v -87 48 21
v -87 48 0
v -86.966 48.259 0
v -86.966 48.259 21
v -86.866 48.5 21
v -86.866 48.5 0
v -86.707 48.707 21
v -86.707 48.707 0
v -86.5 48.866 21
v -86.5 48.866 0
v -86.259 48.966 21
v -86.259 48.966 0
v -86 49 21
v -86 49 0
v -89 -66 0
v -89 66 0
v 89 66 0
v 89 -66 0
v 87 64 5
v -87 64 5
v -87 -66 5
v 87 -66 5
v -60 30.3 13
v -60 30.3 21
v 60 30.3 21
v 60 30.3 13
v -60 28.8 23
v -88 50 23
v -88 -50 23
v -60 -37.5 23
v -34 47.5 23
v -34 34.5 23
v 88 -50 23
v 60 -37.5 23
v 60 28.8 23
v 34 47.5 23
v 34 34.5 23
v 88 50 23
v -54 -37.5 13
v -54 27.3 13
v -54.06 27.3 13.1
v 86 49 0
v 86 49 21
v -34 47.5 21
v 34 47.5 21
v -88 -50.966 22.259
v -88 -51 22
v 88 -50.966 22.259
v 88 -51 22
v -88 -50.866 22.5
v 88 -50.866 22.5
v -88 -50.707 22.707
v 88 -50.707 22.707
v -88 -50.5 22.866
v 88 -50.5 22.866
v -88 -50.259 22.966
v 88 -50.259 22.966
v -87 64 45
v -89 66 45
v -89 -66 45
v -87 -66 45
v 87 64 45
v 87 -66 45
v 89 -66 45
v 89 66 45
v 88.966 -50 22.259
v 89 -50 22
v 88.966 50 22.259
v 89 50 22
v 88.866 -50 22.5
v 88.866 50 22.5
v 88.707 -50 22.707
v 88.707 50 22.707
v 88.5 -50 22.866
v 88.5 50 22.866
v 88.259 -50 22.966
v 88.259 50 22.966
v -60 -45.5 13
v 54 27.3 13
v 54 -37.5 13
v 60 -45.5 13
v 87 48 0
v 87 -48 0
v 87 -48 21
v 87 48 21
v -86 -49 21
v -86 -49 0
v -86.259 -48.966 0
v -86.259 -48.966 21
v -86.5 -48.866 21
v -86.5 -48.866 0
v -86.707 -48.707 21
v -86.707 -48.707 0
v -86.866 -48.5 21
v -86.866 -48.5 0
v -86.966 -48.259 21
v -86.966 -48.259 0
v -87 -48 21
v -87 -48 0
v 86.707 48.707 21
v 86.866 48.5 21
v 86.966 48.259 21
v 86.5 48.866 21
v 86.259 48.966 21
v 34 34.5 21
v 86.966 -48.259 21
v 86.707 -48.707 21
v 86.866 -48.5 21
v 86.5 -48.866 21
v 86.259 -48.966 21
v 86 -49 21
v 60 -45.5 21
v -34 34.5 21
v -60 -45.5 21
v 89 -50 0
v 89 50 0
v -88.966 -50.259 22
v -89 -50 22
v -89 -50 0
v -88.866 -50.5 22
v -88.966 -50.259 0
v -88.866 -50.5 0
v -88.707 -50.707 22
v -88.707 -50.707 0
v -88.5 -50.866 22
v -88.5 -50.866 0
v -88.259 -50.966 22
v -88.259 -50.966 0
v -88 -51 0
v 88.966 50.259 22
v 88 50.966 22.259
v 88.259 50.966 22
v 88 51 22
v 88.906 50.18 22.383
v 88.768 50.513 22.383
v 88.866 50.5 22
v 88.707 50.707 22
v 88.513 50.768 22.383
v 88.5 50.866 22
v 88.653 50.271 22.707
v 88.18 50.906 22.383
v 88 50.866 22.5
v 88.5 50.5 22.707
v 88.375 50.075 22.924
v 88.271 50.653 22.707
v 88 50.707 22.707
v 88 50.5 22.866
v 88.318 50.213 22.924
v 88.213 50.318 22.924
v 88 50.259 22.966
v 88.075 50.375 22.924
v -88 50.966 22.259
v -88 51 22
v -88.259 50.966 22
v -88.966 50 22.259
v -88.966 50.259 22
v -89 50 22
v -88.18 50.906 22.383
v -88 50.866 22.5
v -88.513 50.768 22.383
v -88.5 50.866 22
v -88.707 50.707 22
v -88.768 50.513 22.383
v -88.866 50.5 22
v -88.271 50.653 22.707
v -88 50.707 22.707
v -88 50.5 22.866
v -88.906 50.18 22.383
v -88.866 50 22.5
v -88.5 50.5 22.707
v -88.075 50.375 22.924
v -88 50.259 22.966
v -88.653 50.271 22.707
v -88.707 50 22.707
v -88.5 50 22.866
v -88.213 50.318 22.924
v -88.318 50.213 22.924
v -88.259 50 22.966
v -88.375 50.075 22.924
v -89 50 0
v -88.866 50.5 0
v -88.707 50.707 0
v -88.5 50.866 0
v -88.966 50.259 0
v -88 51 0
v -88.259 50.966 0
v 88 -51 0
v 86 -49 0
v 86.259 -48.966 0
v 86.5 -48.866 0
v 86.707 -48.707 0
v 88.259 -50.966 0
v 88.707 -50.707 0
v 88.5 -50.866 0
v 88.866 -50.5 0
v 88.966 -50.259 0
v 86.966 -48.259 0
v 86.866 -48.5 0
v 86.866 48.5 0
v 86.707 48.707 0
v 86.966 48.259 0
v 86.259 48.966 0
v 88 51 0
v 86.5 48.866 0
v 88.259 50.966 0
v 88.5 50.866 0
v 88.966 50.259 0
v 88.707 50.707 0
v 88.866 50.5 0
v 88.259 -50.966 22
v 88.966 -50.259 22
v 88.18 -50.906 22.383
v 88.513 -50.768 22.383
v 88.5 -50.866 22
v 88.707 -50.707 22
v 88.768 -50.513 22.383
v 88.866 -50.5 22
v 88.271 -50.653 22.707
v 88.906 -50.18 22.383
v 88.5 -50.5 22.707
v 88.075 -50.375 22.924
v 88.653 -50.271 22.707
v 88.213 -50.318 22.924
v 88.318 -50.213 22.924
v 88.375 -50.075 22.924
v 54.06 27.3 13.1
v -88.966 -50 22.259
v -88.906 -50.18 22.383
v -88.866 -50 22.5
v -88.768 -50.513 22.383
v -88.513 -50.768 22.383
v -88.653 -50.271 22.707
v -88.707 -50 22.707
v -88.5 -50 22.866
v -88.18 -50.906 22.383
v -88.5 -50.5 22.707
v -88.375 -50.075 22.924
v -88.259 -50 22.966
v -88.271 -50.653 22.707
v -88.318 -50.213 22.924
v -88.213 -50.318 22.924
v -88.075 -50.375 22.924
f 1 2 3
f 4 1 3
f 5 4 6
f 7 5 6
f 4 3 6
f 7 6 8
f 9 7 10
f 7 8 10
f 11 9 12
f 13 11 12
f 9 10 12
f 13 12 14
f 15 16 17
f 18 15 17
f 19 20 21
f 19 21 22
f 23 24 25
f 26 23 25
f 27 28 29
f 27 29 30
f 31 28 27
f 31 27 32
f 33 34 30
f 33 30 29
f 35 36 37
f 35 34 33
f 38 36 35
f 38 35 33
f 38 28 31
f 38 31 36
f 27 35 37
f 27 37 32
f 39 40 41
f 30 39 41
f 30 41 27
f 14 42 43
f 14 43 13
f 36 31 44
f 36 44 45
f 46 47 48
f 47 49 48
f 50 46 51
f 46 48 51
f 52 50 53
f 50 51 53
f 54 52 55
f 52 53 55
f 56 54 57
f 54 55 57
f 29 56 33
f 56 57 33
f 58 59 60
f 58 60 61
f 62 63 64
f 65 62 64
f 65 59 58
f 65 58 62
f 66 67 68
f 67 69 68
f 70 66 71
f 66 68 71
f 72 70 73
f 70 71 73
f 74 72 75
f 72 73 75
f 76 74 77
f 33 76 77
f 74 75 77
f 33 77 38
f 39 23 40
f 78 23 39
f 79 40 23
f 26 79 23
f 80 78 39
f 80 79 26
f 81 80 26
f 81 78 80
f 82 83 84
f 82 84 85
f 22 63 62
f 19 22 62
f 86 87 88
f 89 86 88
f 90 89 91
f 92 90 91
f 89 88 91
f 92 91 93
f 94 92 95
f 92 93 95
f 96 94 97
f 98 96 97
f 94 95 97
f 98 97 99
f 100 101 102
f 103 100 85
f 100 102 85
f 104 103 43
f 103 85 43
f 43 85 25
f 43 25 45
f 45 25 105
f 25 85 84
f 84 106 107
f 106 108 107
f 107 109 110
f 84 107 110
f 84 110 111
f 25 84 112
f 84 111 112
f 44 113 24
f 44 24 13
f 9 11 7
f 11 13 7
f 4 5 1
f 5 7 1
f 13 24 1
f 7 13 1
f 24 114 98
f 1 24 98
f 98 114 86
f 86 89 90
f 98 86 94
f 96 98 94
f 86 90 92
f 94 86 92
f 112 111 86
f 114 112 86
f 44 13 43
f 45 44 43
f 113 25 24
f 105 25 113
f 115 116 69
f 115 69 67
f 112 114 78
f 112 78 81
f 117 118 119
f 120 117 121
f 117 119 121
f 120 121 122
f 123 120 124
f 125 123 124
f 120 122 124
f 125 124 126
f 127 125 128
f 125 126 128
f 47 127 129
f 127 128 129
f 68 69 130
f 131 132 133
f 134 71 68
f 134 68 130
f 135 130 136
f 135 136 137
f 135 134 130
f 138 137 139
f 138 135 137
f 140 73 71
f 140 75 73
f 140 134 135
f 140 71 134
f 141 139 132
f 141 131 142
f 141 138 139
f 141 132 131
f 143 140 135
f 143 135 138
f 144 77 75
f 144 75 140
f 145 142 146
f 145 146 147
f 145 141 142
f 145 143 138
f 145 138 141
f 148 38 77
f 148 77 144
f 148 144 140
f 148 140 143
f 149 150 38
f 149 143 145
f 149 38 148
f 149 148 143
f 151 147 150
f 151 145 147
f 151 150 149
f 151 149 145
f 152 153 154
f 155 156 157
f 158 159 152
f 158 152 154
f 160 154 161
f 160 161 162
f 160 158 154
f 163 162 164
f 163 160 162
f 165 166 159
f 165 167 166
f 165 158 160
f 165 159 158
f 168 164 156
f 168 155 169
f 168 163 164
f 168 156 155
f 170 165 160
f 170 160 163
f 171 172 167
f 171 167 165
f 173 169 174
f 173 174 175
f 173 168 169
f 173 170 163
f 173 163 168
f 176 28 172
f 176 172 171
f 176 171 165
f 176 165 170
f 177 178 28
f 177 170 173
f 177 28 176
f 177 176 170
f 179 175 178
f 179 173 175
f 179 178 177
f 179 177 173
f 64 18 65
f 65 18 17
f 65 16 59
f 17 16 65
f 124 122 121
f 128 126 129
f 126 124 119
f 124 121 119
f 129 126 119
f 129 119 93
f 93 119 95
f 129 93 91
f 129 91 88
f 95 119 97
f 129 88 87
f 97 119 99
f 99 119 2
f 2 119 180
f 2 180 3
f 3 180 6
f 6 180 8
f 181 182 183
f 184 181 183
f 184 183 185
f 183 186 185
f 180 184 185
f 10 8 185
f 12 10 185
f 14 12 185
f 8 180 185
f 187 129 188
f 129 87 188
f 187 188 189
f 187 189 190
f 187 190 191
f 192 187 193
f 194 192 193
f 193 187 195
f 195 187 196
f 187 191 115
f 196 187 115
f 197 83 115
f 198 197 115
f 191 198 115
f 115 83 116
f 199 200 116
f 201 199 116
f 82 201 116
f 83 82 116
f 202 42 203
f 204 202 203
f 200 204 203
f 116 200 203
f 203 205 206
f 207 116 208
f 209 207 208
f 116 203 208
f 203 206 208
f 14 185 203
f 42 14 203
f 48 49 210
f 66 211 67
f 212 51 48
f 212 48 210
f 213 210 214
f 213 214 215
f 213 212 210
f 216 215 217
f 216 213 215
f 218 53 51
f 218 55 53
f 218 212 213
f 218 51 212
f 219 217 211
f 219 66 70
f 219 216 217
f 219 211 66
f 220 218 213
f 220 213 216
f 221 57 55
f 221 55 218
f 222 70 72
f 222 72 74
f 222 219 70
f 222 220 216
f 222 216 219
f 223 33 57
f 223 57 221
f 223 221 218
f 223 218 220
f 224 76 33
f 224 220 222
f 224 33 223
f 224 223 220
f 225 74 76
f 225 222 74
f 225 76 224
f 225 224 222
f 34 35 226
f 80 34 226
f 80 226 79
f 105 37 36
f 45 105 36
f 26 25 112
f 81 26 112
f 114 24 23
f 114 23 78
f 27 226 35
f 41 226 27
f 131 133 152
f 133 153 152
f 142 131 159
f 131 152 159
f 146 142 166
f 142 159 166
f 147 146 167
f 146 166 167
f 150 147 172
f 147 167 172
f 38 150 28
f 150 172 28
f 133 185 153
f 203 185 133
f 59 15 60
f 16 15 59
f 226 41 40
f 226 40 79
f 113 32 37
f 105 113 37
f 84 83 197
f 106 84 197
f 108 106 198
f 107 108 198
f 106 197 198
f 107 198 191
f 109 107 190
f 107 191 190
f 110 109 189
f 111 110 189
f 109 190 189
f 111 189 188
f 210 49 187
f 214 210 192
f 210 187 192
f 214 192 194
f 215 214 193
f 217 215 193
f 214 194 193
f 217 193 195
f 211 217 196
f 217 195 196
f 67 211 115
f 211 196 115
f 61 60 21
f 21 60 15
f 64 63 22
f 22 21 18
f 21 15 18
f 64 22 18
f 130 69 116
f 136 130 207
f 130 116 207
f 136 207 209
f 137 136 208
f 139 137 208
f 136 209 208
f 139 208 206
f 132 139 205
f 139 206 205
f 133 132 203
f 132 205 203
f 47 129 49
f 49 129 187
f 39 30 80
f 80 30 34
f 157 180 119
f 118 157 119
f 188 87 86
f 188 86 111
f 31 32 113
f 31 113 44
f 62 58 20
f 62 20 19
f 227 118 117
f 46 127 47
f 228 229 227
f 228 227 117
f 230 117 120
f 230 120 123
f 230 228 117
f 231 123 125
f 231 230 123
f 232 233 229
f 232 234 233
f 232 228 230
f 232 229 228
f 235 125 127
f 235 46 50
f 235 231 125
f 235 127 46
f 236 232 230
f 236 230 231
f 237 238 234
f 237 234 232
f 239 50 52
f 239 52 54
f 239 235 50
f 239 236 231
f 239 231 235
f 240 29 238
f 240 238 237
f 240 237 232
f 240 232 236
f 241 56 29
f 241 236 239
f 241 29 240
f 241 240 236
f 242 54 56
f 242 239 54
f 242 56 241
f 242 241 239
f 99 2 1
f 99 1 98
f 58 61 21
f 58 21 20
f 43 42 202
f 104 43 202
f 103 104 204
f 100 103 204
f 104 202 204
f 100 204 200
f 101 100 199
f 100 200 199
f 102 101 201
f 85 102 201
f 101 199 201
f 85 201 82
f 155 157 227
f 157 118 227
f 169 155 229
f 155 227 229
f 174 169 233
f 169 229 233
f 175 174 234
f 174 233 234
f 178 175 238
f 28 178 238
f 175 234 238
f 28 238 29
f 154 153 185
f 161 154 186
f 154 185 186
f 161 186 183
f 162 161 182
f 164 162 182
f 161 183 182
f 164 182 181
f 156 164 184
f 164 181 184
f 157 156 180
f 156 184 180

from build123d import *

# Parameters (mm, degrees)
SKETCH_W        = 178
SKETCH_H        = 132
PAD_DEPTH       = 45
SKETCH001_W     = 174
SKETCH001_H     = 130
POCKET_DEPTH    = 40
PAD001_DEPTH    = 23
FILLET_R        = 1
POCKET001_DEPTH = 21
SKETCH004_W     = 120
SKETCH004_H     = 66.8
POCKET002_DEPTH = 5
SKETCH005_W     = 68
SKETCH005_H     = 13
POCKET003_DEPTH = 5
SKETCH006_W     = 120
SKETCH006_H     = 66.8
PAD002_DEPTH    = 10
SKETCH007_W     = 108
SKETCH007_H     = 64.8
POCKET004_DEPTH = 11
POCKET005_DEPTH = 64.8
SKETCH009_W     = 120
SKETCH009_H     = 1
SKETCH009_H_2   = 8
PAD003_DEPTH    = 8
CHAMFER_SIZE2   = 9.9
CHAMFER_SIZE    = 1.5


with BuildPart() as screen_base:
    # Sketch → Pad (new body)
    with BuildSketch(Plane.XY):
        Rectangle(SKETCH_W, SKETCH_H)
    extrude(amount=PAD_DEPTH)

    # Sketch001 (on Face6 of Pad) → Pocket (cut)
    with BuildSketch(Plane.XY.offset(45)):
        with Locations((0, -1)):
            Rectangle(SKETCH001_W, SKETCH001_H)
    extrude(amount=-POCKET_DEPTH, mode=Mode.SUBTRACT)


with BuildPart() as screen_panel:
    # Sketch002 → Pad001 (new body)
    with BuildSketch(Plane.XY):
        with BuildLine():
            Line((-89, 50), (-89, -50))
            ThreePointArc((-89, -50), (-88.7071067812, -50.7071067812), (-88, -51))
            Line((-88, -51), (88, -51))
            ThreePointArc((88, -51), (88.7071067812, -50.7071067812), (89, -50))
            Line((89, 50), (89, -50))
            ThreePointArc((89, 50), (88.7071067812, 50.7071067812), (88, 51))
            Line((-88, 51), (88, 51))
            ThreePointArc((-88, 51), (-88.7071067812, 50.7071067812), (-89, 50))
        make_face()
    extrude(amount=PAD001_DEPTH)

    # Fillet
    fillet_edges = [screen_panel.edges().sort_by_distance(p)[0] for p in [
        (-89, 0, 23),
    ]]
    fillet(fillet_edges, radius=FILLET_R)

    # Sketch003 (on Face4 of Fillet) → Pocket001 (cut)
    with BuildSketch(Plane(origin=(0, 0, 0), x_dir=(1, 0, 0), z_dir=(0, 0, -1))):
        with BuildLine():
            Line((-87, -48), (-87, 48))
            ThreePointArc((-86, 49), (-86.7071067812, 48.7071067812), (-87, 48))
            Line((-86, 49), (86, 49))
            ThreePointArc((87, 48), (86.7071067812, 48.7071067812), (86, 49))
            Line((87, 48), (87, -48))
            ThreePointArc((86, -49), (86.7071067812, -48.7071067812), (87, -48))
            Line((86, -49), (-86, -49))
            ThreePointArc((-87, -48), (-86.7071067812, -48.7071067812), (-86, -49))
        make_face()
    extrude(amount=-POCKET001_DEPTH, mode=Mode.SUBTRACT)

    # Sketch004 (on Face22 of Pocket001) → Pocket002 (cut)
    with BuildSketch(Plane.XY.offset(23)):
        with Locations((0, -4.1)):
            Rectangle(SKETCH004_W, SKETCH004_H)
    extrude(amount=-POCKET002_DEPTH, mode=Mode.SUBTRACT)

    # Sketch005 (on Face22 of Pocket002) → Pocket003 (cut)
    with BuildSketch(Plane.XY.offset(23)):
        with Locations((0, 41)):
            Rectangle(SKETCH005_W, SKETCH005_H)
    extrude(amount=-POCKET003_DEPTH, mode=Mode.SUBTRACT)

    # Sketch006 (on Face22 of Pocket003) → Pad002 (join)
    with BuildSketch(Plane.XY.offset(23)):
        with Locations((0, -4.1)):
            Rectangle(SKETCH006_W, SKETCH006_H)
    extrude(amount=-PAD002_DEPTH)

    # Sketch007 (on Face28 of Pad002) → Pocket004 (cut)
    with BuildSketch(Plane.XY.offset(23)):
        with Locations((0, -5.1)):
            Rectangle(SKETCH007_W, SKETCH007_H)
    extrude(amount=-POCKET004_DEPTH, mode=Mode.SUBTRACT)

    # Sketch008 (on Face40 of Pocket004) → Pocket005 (cut)
    with BuildSketch(Plane.XZ.offset(-27.3)):
        Polygon((-60, 23), (-54, 23), (-54, 13), align=None)
        Polygon((54, 23), (60, 23), (54, 13), align=None)
    extrude(amount=POCKET005_DEPTH, mode=Mode.SUBTRACT)

    # Sketch009 (on Face27 of Pocket005) → Pad003 (join)
    with BuildSketch(Plane(origin=(0, 0, 21), x_dir=(1, 0, 0), z_dir=(0, 0, -1))):
        with Locations((0, -29.8)):
            Rectangle(SKETCH009_W, SKETCH009_H)
        with Locations((0, 41.5)):
            Rectangle(SKETCH009_W, SKETCH009_H_2)
    extrude(amount=PAD003_DEPTH)

    # Chamfer
    chamfer_edges = [screen_panel.edges().sort_by_distance(p)[0] for p in [
        (0, 27.3, 23),
        (57, 27.3, 23),
        (-57, 27.3, 23),
    ]]
    chamfer_side = screen_panel.faces().sort_by_distance((0, 28.3, 23))[0]
    chamfer(chamfer_edges, length=CHAMFER_SIZE, length2=CHAMFER_SIZE2, reference=chamfer_side)


solid = Compound([screen_base.part, screen_panel.part])
